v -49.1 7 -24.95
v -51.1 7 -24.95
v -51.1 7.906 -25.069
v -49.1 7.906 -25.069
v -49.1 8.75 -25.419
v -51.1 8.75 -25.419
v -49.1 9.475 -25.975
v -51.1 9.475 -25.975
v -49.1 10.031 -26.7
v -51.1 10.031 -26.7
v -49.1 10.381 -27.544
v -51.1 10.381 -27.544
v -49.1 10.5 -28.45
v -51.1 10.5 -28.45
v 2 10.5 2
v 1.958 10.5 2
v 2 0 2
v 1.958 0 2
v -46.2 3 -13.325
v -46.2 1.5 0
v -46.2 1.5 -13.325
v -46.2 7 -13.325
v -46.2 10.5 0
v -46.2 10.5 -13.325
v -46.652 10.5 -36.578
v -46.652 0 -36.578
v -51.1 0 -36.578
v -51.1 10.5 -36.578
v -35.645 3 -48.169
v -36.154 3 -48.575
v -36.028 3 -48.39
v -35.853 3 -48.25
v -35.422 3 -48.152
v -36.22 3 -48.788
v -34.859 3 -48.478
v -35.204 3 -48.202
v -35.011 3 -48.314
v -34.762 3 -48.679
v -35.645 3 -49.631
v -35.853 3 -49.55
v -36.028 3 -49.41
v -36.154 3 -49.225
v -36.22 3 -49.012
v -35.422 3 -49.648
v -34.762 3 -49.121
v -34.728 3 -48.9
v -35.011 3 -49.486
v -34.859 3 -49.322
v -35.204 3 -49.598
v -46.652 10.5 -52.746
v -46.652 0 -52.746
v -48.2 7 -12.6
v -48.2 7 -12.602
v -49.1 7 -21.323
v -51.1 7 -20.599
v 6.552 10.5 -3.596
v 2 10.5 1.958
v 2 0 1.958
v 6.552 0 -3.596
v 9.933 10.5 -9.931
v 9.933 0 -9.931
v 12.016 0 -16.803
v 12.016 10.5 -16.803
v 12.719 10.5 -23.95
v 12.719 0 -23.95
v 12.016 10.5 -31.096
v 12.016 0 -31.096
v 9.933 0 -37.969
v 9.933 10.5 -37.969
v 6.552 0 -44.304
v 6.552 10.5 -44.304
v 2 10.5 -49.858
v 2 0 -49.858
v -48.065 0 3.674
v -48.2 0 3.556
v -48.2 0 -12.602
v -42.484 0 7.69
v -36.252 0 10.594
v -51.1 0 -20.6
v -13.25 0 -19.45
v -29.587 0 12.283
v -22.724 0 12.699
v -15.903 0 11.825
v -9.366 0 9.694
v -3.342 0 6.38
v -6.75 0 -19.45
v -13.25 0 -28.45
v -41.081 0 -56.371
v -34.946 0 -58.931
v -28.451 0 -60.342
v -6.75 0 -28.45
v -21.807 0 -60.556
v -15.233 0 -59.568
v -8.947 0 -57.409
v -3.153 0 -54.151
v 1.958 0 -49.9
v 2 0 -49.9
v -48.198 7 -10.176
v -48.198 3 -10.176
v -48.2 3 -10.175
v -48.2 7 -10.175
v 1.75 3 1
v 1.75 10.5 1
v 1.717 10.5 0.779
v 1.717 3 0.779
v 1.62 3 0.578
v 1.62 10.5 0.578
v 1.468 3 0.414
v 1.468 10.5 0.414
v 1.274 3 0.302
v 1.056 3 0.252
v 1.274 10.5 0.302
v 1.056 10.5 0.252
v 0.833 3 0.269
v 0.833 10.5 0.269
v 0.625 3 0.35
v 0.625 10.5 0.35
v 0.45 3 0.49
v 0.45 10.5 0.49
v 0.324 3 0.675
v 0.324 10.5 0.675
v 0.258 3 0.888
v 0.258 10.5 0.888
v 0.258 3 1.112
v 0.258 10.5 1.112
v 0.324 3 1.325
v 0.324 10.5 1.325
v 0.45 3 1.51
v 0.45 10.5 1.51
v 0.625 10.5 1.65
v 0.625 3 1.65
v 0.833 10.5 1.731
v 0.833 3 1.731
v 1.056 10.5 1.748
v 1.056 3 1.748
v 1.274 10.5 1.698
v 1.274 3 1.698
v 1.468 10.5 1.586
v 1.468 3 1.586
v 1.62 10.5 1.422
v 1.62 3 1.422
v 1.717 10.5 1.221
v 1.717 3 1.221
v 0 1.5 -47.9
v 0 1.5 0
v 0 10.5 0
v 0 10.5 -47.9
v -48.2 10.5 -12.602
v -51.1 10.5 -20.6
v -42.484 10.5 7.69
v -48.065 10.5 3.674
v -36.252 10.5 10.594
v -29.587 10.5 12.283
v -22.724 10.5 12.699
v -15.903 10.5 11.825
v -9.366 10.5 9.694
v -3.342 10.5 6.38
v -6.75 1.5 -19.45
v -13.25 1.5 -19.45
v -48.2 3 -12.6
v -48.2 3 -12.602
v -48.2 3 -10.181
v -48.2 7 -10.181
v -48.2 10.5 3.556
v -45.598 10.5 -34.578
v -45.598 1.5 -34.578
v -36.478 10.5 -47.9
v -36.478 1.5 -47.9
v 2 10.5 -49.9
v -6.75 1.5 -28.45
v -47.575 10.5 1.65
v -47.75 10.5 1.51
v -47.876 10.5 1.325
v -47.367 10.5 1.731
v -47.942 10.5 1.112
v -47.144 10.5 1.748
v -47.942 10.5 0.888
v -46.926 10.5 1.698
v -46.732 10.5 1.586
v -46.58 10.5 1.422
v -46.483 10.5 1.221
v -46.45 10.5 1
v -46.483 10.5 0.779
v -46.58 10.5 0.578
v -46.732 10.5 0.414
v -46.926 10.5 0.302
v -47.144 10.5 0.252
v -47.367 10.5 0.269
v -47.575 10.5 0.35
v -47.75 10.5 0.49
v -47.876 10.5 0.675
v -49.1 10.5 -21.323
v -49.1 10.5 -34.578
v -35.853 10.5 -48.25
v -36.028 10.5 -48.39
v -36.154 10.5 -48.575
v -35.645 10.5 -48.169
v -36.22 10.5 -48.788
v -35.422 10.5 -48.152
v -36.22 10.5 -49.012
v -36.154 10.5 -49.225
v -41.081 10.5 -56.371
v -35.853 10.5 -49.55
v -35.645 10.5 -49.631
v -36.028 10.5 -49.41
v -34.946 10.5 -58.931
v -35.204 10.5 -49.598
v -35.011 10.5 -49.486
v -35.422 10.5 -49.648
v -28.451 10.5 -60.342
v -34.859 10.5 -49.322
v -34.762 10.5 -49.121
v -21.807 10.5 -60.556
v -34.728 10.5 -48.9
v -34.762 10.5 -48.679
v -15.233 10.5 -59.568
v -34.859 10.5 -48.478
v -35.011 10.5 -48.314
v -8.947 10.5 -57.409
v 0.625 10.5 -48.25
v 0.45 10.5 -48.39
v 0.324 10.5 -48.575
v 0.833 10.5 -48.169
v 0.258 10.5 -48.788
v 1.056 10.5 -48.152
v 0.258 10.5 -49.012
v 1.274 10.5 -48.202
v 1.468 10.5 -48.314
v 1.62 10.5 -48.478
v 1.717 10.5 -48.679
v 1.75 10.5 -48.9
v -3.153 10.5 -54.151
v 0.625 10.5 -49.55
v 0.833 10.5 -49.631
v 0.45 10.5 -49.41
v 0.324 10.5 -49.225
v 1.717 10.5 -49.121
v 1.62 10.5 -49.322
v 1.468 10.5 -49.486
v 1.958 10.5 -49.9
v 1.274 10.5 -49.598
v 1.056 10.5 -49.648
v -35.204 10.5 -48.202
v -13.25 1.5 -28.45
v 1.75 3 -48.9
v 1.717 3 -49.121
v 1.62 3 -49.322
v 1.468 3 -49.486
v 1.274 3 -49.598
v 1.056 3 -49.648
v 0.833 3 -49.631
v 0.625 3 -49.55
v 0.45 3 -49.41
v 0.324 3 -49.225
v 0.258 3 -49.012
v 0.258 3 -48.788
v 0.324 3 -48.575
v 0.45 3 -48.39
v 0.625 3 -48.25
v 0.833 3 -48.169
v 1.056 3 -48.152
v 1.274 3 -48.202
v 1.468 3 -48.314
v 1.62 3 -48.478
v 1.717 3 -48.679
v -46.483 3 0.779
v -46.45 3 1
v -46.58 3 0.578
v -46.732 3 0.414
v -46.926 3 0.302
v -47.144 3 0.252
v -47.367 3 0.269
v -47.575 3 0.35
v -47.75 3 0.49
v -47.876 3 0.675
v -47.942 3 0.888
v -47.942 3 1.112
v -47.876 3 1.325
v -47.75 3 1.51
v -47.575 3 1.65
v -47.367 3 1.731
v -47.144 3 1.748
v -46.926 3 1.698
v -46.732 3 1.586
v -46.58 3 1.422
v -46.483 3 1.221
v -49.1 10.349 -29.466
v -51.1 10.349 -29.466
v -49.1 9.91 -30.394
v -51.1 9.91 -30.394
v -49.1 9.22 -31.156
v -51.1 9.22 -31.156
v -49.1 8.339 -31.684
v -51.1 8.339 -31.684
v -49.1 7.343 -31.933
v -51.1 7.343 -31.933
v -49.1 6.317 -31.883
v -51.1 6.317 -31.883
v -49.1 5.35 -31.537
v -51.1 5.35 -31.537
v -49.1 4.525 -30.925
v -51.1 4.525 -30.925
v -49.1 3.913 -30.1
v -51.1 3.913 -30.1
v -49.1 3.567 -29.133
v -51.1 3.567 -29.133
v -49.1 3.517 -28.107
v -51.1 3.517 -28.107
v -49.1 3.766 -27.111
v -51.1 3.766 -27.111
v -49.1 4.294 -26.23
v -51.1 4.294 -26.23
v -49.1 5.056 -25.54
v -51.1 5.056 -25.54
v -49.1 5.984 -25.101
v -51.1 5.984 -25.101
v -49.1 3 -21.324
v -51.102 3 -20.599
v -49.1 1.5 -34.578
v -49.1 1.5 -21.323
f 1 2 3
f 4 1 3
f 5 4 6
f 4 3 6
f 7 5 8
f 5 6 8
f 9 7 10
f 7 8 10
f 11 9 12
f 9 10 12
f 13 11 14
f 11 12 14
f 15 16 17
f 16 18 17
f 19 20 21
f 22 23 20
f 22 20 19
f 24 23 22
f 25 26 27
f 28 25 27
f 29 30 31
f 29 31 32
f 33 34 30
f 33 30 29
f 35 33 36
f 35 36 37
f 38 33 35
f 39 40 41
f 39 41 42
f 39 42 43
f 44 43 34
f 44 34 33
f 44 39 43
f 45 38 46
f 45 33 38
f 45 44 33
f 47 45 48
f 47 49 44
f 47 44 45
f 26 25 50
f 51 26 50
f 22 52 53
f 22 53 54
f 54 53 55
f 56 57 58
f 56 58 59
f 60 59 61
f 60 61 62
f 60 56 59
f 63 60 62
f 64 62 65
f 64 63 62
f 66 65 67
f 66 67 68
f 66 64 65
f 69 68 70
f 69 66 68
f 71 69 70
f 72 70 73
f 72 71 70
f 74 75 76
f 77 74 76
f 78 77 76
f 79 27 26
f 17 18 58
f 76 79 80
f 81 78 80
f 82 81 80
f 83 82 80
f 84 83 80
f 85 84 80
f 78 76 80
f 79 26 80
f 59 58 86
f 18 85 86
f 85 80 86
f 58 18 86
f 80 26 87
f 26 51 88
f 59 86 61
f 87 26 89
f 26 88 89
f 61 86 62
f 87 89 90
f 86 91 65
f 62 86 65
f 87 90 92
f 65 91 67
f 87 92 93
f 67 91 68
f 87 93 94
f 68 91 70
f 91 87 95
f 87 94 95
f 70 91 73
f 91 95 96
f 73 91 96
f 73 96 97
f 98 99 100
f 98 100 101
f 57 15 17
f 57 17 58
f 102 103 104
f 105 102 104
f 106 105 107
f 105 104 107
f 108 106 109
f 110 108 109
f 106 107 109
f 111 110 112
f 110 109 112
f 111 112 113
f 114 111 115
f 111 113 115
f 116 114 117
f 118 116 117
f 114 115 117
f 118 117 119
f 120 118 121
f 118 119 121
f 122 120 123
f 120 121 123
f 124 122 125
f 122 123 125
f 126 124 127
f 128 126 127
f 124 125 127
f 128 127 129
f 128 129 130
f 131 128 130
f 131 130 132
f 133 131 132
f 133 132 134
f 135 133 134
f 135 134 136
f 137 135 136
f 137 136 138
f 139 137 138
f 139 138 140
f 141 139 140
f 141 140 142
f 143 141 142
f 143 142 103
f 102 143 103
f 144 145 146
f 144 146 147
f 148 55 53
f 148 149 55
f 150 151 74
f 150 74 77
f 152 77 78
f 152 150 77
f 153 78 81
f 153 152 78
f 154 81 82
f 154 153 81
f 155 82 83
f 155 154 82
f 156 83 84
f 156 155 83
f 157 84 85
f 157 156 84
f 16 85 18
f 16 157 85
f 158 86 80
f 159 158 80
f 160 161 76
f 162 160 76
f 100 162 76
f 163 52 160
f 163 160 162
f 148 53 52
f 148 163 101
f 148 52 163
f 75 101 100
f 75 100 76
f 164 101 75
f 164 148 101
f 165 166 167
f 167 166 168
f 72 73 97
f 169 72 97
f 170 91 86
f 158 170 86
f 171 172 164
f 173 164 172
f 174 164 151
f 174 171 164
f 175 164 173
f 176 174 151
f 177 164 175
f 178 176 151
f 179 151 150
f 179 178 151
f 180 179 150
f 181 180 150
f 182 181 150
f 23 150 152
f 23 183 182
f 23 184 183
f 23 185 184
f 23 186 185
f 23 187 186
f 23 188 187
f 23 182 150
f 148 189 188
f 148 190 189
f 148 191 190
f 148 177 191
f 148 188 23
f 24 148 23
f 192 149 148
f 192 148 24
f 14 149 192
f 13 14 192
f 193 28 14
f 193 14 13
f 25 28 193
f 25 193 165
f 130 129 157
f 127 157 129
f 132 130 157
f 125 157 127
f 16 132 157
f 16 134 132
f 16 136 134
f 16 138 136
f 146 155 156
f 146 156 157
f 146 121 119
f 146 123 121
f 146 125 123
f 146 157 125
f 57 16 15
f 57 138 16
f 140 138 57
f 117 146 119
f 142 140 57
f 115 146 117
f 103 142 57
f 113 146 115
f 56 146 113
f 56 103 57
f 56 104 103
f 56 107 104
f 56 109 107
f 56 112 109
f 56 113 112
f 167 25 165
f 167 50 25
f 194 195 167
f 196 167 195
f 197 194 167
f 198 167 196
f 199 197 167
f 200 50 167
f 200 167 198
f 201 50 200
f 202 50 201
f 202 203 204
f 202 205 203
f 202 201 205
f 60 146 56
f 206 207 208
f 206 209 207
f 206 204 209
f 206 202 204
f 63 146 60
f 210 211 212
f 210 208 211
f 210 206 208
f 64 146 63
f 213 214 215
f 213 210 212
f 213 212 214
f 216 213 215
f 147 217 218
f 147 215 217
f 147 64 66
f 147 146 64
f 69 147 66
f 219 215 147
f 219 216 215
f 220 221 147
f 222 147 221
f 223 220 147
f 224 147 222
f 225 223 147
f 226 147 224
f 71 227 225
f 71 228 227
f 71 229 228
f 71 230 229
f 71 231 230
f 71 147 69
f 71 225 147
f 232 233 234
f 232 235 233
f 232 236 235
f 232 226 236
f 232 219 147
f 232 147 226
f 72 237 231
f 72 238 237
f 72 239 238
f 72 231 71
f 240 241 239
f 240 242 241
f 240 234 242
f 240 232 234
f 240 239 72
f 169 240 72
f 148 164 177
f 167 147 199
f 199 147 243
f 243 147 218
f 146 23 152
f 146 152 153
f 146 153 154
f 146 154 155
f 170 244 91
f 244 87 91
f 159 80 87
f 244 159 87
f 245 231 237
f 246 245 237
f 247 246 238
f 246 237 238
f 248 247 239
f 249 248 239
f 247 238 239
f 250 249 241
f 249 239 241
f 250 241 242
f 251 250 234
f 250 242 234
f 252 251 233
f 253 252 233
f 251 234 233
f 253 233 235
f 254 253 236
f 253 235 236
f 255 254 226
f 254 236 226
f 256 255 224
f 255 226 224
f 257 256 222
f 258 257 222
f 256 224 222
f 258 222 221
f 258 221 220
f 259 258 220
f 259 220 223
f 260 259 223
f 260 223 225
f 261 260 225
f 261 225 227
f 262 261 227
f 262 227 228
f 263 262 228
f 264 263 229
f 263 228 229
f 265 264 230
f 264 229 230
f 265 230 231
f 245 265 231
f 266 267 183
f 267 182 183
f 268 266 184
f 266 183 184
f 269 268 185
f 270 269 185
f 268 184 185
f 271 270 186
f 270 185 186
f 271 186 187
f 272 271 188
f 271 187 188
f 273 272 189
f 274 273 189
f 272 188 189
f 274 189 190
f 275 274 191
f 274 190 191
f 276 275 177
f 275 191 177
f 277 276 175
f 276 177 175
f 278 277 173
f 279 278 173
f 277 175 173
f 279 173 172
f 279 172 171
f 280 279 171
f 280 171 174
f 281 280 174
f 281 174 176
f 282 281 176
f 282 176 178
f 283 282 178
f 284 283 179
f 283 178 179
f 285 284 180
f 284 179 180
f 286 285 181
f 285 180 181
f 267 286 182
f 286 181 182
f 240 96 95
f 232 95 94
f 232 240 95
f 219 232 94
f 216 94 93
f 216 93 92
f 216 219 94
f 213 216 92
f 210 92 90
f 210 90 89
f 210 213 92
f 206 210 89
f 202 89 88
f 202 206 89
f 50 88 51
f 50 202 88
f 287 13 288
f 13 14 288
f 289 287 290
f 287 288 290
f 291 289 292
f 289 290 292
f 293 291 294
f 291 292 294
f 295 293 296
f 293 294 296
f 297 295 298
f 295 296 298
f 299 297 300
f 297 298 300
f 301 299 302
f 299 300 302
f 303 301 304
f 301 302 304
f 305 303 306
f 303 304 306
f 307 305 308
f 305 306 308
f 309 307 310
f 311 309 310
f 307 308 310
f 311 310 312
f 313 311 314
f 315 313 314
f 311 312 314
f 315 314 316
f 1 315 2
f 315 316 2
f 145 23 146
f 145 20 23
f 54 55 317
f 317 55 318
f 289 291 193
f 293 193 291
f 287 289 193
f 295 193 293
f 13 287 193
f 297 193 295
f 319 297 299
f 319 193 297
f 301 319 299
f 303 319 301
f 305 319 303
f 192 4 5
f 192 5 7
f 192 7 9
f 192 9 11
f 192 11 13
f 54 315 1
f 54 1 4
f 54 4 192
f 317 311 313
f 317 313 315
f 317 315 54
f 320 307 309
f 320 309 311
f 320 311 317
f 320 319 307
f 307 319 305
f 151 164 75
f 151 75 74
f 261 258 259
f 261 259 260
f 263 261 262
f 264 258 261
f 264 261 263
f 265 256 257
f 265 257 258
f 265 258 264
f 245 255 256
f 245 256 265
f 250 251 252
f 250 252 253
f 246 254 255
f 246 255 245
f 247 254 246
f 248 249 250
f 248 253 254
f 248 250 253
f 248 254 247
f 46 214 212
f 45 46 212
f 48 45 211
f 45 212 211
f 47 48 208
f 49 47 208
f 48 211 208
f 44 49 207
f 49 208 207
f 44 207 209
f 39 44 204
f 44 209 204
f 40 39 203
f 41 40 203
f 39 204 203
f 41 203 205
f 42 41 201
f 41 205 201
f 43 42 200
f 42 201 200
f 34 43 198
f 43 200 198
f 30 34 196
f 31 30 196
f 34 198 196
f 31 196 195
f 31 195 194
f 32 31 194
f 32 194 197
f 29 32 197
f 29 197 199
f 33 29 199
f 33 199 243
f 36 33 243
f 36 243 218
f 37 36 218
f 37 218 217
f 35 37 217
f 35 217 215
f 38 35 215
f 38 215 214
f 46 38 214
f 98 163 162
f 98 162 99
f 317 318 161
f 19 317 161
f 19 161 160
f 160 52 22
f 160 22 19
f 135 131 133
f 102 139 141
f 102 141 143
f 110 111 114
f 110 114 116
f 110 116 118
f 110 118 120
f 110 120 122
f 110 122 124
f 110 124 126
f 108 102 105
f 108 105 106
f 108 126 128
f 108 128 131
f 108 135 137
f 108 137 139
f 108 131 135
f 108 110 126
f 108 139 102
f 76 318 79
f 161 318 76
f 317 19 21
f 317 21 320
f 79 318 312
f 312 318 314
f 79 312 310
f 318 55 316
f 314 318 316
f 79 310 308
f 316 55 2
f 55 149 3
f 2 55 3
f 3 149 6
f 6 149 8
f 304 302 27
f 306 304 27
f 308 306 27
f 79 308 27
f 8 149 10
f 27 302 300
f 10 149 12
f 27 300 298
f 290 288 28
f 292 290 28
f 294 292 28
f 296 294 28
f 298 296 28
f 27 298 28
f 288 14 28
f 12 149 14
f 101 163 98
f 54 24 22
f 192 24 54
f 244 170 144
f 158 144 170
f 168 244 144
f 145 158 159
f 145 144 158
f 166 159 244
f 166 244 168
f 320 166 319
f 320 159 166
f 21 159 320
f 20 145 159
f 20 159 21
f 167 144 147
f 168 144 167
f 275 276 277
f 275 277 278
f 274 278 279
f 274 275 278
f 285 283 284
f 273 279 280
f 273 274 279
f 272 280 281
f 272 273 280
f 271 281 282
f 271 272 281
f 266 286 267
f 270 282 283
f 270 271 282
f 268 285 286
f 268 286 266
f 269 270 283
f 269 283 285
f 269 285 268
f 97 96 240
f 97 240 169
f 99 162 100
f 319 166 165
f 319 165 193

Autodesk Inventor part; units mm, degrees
ref_plane "YZ Plane" through (0, 0, 0) normal (1, 0, 0) x (0, 1, 0)
ref_plane "XZ Plane" through (0, 0, 0) normal (0, 1, 0) x (-1, 0, 0)
ref_plane "XY Plane" through (0, 0, 0) normal (0, 0, 1) x (1, 0, 0)
sketch "Sketch1" plane through (0, 0, 0) normal (0, 1, 0) x (-1, 0, 0)
  line L0 (0, 0) -> (49.1, 0)
  line L1 (49.1, -47.9) -> (0, -47.9)
  line L2 (0, -47.9) -> (0, 0)
  line L3 (46.7, -10.9) -> (49.1, -18.9)
  line L4 (46.7, -10.9) -> (46.7, 0)
  line L5 (49.1, 0) -> (46.7, 0)
  line L6 (49.1, -18.9) -> (49.1, -47.9)
  dimension "d0" = 49.1
  dimension "d1" = 47.9
  dimension "d2" = 18.9
extrude "Extrusion1" add sketch "Sketch1" along normal blind 1.5
sketch "Sketch2" plane through (0, 1.5, 0) normal (0, 1, 0) x (1, 0, 0)
  line L0 (-49.1, 18.9) -> (-46.7, 10.9) projected
  line L1 (-46.2, 10.9) -> (-46.2, 0)
  line L2 (-46.2, 0) -> (-46.7, 0)
  line L3 (-46.7, 10.9) -> (-46.7, 0) projected
  line L4 (-46.7, 0) -> (-46.7, 10.9)
  line L5 (-49.1, 47.9) -> (-49.1, 18.9) projected
  line L6 (-46.7, 10.9) -> (-49.1, 18.9)
  line L7 (-49.1, 18.9) -> (-46.2, 10.9)
  point P0 (0, 0)
extrude "Extrusion2" cut sketch "Sketch2" against normal blind 10
sketch "Sketch3" plane through (0, 1.5, 0) normal (0, 1, 0) x (1, 0, 0)
  line L0 (-49.1, 47.9) -> (-49.1, 18.9) projected
  line L1 (-49.1, 34.5784) -> (-45.5979, 34.5784)
  line L2 (-45.5979, 34.5784) -> (-36.4784, 47.9)
  line L3 (0, 47.9) -> (-49.1, 47.9) projected
  line L4 (-49.1, 47.9) -> (-36.4784, 47.9)
  line L5 (-49.1, 47.9) -> (-49.1, 34.5784)
  point P0 (0, 0)
extrude "Extrusion3" cut sketch "Sketch3" against normal blind 10
sketch "Sketch4" plane through (0, 1.5, 0) normal (0, 1, 0) x (1, 0, 0)
  line L0 (-46.2, 10.9) -> (-49.1, 18.9) projected
  line L1 (-46.2, 0) -> (0, 0) projected
  line L2 (-46.2, -2) -> (0, -2)
  line L3 (0, -2) -> (2, -2)
  line L4 (2, -2) -> (2, 47.9)
  line L5 (0, 47.9) -> (-36.4784, 47.9) projected
  line L6 (2, 47.9) -> (2, 49.9)
  line L7 (2, 49.9) -> (-36.4784, 49.9)
  line L8 (-38.1287, 49.0298) -> (-37.533, 49.9)
  line L9 (-37.533, 49.9) -> (-36.4784, 49.9)
  line L10 (-45.5979, 34.5784) -> (-36.4784, 47.9) projected
  line L11 (-49.1, 36.5784) -> (-46.6525, 36.5784)
  line L12 (-46.6525, 36.5784) -> (-37.533, 49.9)
  line L13 (-46.2, -2) -> (-48.2, -2)
  line L14 (-48.2, -2) -> (-48.2, 10.9)
  line L15 (-51.1, 18.9) -> (-48.2, 10.9)
  line L16 (-49.1, 36.5784) -> (-51.1, 36.5784)
  line L17 (-51.1, 36.5784) -> (-51.1, 18.9)
  line L18 (0, 0) -> (0, 47.9) projected
  line L19 (0, 0) -> (0, 47.9)
  line L20 (0, 47.9) -> (-36.4784, 47.9)
  line L21 (-36.4784, 47.9) -> (-45.5979, 34.5784)
  line L22 (-45.5979, 34.5784) -> (-49.1, 34.5784) projected
  line L23 (-49.1, 34.5784) -> (-45.5979, 34.5784)
  line L24 (-49.1, 34.5784) -> (-49.1, 18.9) projected
  line L25 (-49.1, 34.5784) -> (-49.1, 18.9)
  line L26 (-49.1, 18.9) -> (-46.2, 10.9)
  line L27 (-46.2, 0) -> (-46.2, 10.9)
  line L28 (-46.2, 0) -> (0, 0)
  dimension "d16" = 2
  dimension "d17" = 2
  dimension "d18" = 2
  dimension "d23" = 2
extrude "Extrusion4" add sketch "Sketch4" along normal blind 9
sketch "Sketch5" plane through (0, 0, 0) normal (0, -1, 0) x (1, 0, 0)
  line L0 (-46.2, 0) -> (0, 0) projected
  line L1 (0, 0) -> (-46.2, 0)
  line L2 (-46.2, 0) -> (-46.2, -10.9) projected
  line L3 (-46.2, 0) -> (-46.2, -10.9)
  line L4 (-46.2, -10.9) -> (-49.1, -18.9) projected
  line L5 (-46.2, -10.9) -> (-49.1, -18.9)
  line L6 (-49.1, -18.9) -> (-49.1, -34.5784) projected
  line L7 (-49.1, -18.9) -> (-49.1, -34.5784)
  line L8 (-49.1, -34.5784) -> (-45.5979, -34.5784) projected
  line L9 (-49.1, -34.5784) -> (-45.5979, -34.5784)
  line L10 (-36.4784, -47.9) -> (-45.5979, -34.5784) projected
  line L11 (-45.5979, -34.5784) -> (-36.4784, -47.9)
  line L12 (-36.4784, -47.9) -> (0, -47.9) projected
  line L13 (-36.4784, -47.9) -> (0, -47.9)
  line L14 (0, -47.9) -> (0, 0)
  line L15 (-48.2, 2) -> (2, 2) projected
  line L16 (2, 2) -> (-48.2, 2)
  line L17 (-51.1, -18.9) -> (-48.2, -10.9) projected
  line L18 (-48.2, 2) -> (-48.2, -10.9)
  line L19 (-48.2, -10.9) -> (-51.1, -18.9)
  line L20 (-51.1, -18.9) -> (-51.1, -36.5784)
  line L21 (-46.6525, -36.5784) -> (-51.1, -36.5784) projected
  line L22 (-51.1, -36.5784) -> (-46.6525, -36.5784)
  line L23 (-37.533, -49.9) -> (-46.6525, -36.5784) projected
  line L24 (-46.6525, -36.5784) -> (-37.533, -49.9)
  line L25 (2, 2) -> (2, -49.9) projected
  line L26 (-37.533, -49.9) -> (2, -49.9)
  line L27 (2, -49.9) -> (2, 2)
extrude "Extrusion5" add sketch "Sketch5" against normal blind 1.5
sketch "Sketch6" plane through (0, 10.5, 0) normal (0, 1, 0) x (1, 0, 0)
  line L0 (-48.2, -2) -> (2, -2) projected
  circle A0 centre (1, -1) radius 0.75
  line L1 (-46.2, 0) -> (-46.2, 10.9) projected
  circle A1 centre (-47.2, -1) radius 0.75
  point P0 (0, 0)
  dimension "d35" = 1.5
sketch "Sketch7" plane through (0, 10.5, 0) normal (0, 1, 0) x (1, 0, 0)
  point P0 (0, 0)
extrude "Extrusion6" cut sketch "Sketch6" against normal blind 7.5
sketch "Sketch8" plane through (0, 10.5, 0) normal (0, 1, 0) x (1, 0, 0)
  line L0 (-45.5979, 34.5784) -> (-36.4784, 47.9) projected
  circle A0 centre (-35.4784, 48.9) radius 0.75
  circle A1 centre (1, 48.9) radius 0.75
  point P0 (0, 0)
  dimension "d40" = 1.5
  dimension "d43" = 1.5
extrude "Extrusion7" cut sketch "Sketch8" against normal blind 7.5
sketch "Sketch9" plane through (0, 0, 0) normal (0, -1, 0) x (1, 0, 0)
  line L0 (-48.2, 2) -> (2, 2) projected
  line L1 (2, 2) -> (2, -49.9) projected
  line L2 (-6.75, -23.95) -> (-6.75, -19.45)
  line L3 (-6.75, -19.45) -> (-13.25, -19.45)
  line L4 (-13.25, -19.45) -> (-13.25, -28.45)
  line L5 (-13.25, -28.45) -> (-6.75, -28.45)
  line L6 (-6.75, -28.45) -> (-6.75, -23.95)
  point P0 (0, 0)
  dimension "d51" = 6.5
  dimension "d52" = 9
extrude "Extrusion8" cut sketch "Sketch9" against normal blind 1.5
sketch "Sketch10" plane through (0, 10.5, 0) normal (0, 1, 0) x (1, 0, 0)
  line L0 (-49.1, 18.9) -> (-46.2, 10.9) projected
  line L1 (-48.2, -2) -> (-48.2, 10.9) projected
  line L2 (-48.2, 10.9) -> (-51.1, 18.9) projected
  line L3 (-48.2, 10.175) -> (-48.2, 10.9)
  line L4 (-51.1, 18.9) -> (-51.1, 36.5784) projected
  line L5 (-51.1, 18.175) -> (-51.1, 18.9)
  line L6 (-51.1, 18.175) -> (-48.2, 10.175)
  line L7 (-48.2, 10.9) -> (-51.1, 18.9)
  point P0 (0, 0)
extrude "Extrusion9" add sketch "Sketch10" against normal blind 10.5
sketch "Sketch11" plane through (-51.1, 0, -18.175) normal (-0.9401361, 0, 0.3407993) x (0.3407993, 0, 0.9401361)
  point P0 (34.5018, 0)
sketch "Sketch12" plane through (-51.1, 0, -18.175) normal (-0.9401361, 0, 0.3407993) x (0.3407993, 0, 0.9401361)
  line L0 (0, 10.5) -> (0, 0) projected
  line L1 (5.4546, 0) -> (3.2394, 0) projected
  line L2 (4.2545, 0) -> (7.2545, 0) construction
  line L3 (4.2545, 7) -> (0, 7)
  line L4 (0, 7) -> (0, 3)
  line L5 (0, 3) -> (8.5094, 3)
  line L6 (8.5094, 1.5) -> (8.5094, 10.5) projected
  line L7 (4.2545, 7) -> (8.5094, 7)
  line L8 (8.5094, 10.5) -> (8.5094, 0) projected
  line L9 (8.5094, 3) -> (8.5094, 7)
  line L10 (0, 10.5) -> (8.5094, 10.5) projected
  line L11 (0, 10.5) -> (0, 0) projected
  line L12 (8.5094, 0) -> (0, 0) projected
  line L13 (8.5094, 10.5) -> (8.5094, 0) projected
  point P0 (34.5018, 0)
  dimension "d58" = 4.2545
extrude "Extrusion10" cut sketch "Sketch12" along normal blind 5 contours L3 L7 L6 L5 L0
sketch "Sketch14" plane through (0, 10.5, 0) normal (0, 1, 0) x (1, 0, 0)
  point P0 (0, 0)
sketch "Sketch15" plane through (0, 10.5, 0) normal (0, 1, 0) x (1, 0, 0)
  line L0 (-46.2, 0) -> (-46.2, 10.9) projected
  line L1 (-46.2, 10.9) -> (-46.2, 11.9)
  line L2 (-46.2, 11.9) -> (-49.1, 19.8981)
  line L3 (-49.1, 34.5784) -> (-49.1, 18.9) projected
  line L4 (-46.2, 11.9) -> (-37.6924, 11.9) construction
  line L5 (-49.1, 19.8981) -> (-49.1, 18.9)
  line L6 (-49.1, 18.9) -> (-46.2, 10.9) projected
  line L7 (-49.1, 18.9) -> (-46.2, 10.9)
  point P0 (0, 0)
  dimension "d71" = 1
  dimension "d72" = 109.93
extrude "Extrusion12" add sketch "Sketch15" against normal blind 9
sketch "Sketch16" plane through (0, 10.5, 0) normal (0, 1, 0) x (1, 0, 0)
  line L0 (-51.1, 18.175) -> (-48.2, 10.175) projected
  line L1 (-51.1, 18.175) -> (-51.1, 19.175)
  line L2 (-51.1, 36.5784) -> (-51.1, 18.175) projected
  line L3 (-51.1, 19.175) -> (-48.2, 11.1769)
  line L4 (-51.1, 19.175) -> (-42.5924, 19.175) construction
  line L5 (-48.2, 11.1769) -> (-48.2, 10.175)
  line L6 (-48.2, 10.175) -> (-48.2, -2) projected
  line L7 (-51.1, 18.175) -> (-48.2, 10.175)
  point P0 (0, 0)
  dimension "d75" = 1
  dimension "d76" = 70.07
extrude "Extrusion13" cut sketch "Sketch16" against normal blind 10.5
sketch "Sketch17" plane through (-51.1, 0, -36.5784) normal (-1, 0, 0) x (0, 0, 1)
  line L0 (-13.3216, 0) -> (-13.3216, 10.5) projected
  line L1 (36.8284, 10.5) -> (36.8284, 3) projected
  line L2 (38.5784, 0) -> (38.5784, 10.5) projected
  line L3 (15.9784, 5.25) -> (15.9784, 10.5) construction
  line L4 (16.6804, 10.5) -> (2, 10.5) projected
  point P0 (36.5784, 0)
sketch "Sketch18" plane through (0, 10.5, 0) normal (0, 1, 0) x (1, 0, 0)
  line L0 (-51.1, 19.175) -> (-51.1, 36.5784) projected
  line L1 (-51.1, 19.175) -> (-51.1, 20.6)
  line L2 (-51.1, 20.6) -> (-48.2, 12.6019)
  line L3 (-51.1, 20.6) -> (-42.5924, 20.6) construction
  line L4 (-51.1, 19.175) -> (-48.2, 11.1769) projected
  line L5 (-48.2, 12.6019) -> (-48.2, 11.1769)
  line L6 (-51.1, 19.175) -> (-48.2, 11.1769)
  point P0 (0, 0)
  dimension "d82" = 1.425
  dimension "d83" = 70.07
extrude "Extrusion14" cut sketch "Sketch18" against normal blind 10.5
sketch "Sketch19" plane through (0, 10.5, 0) normal (0, 1, 0) x (1, 0, 0)
  line L0 (-46.2, 11.9) -> (-49.1, 19.8981) projected
  line L1 (-46.2, 11.9) -> (-46.2, 13.325)
  line L2 (-46.2, 13.325) -> (-49.1, 21.3231)
  line L3 (-49.1, 19.8981) -> (-49.1, 34.5784) projected
  line L4 (-49.1, 21.3231) -> (-49.1, 19.8981)
  line L5 (-49.1, 19.8981) -> (-46.2, 11.9)
  point P0 (0, 0)
  dimension "d86" = 1.425
  dimension "d87" = 160.07
extrude "Extrusion15" add sketch "Sketch19" against normal blind 9
sketch "Sketch20" plane through (-51.1, 0, -20.6) normal (-0.9401098, 0, 0.3408718) x (0.3408718, 0, 0.9401098)
  line L0 (0, 3) -> (8.5096, 3)
  line L1 (8.5096, 10.5) -> (8.5096, 1.5) projected
  line L2 (8.5096, 3) -> (8.5096, 7)
  line L3 (8.5096, 7) -> (0.002, 7)
  line L4 (0.002, 10.5) -> (0.002, 1.5) projected
  line L5 (0, 3) -> (0.002, 7)
  point P0 (36.7848, 0)
  point P1 (0, 0)
  point P2 (8.5096, 7)
  dimension "d90" = 3
  dimension "d91" = 4
extrude "Extrusion16" cut sketch "Sketch20" against normal blind 10
sketch "Sketch21" plane through (-51.1, 0, -36.5784) normal (-1, 0, 0) x (0, 0, 1)
  point P0 (36.5784, 0)
sketch "Sketch22" plane through (-51.1, 0, -36.5784) normal (-1, 0, 0) x (0, 0, 1)
  line L0 (15.9784, 0) -> (0, 0) projected
  line L1 (17.1284, 0) -> (8.1284, 0) projected
  circle A0 centre (8.1284, 7) radius 3.5
  point P0 (36.5784, 0)
  dimension "d98" = 7
extrude "Extrusion17" cut sketch "Sketch22" against normal blind 10
sketch "Sketch23" plane through (0, 10.5, 0) normal (0, 1, 0) x (1, 0, 0)
  line L0 (2, -2) -> (2, 49.9) projected
  line L1 (2, 23.95) -> (-23.95, 23.95)
  arc A0 (-48.065, -3.674) -> (-46.6525, 52.746) centre (-23.95, 23.95) ccw
  line L2 (2, -2) -> (-48.2, -2) projected
  line L3 (-48.2, -2) -> (-48.2, -3.5555)
  line L4 (-48.2, -3.5555) -> (-48.065, -3.674)
  line L5 (-46.6525, 36.5784) -> (-46.6525, 52.746)
  line L6 (-48.2, -2) -> (2, -2)
  line L7 (2, -2) -> (2, 49.9)
  line L8 (2, 49.9) -> (-37.533, 49.9)
  line L9 (-37.533, 49.9) -> (-46.6525, 36.5784)
  point P0 (0, 0)
  point P1 (1.9578, 49.9)
  point P2 (2, -1.9578)
  point P3 (2, 49.8578)
  point P4 (1.9578, -2)
  dimension "d114" = 25.95
  dimension "d115" = 36.669
extrude "Extrusion18" add sketch "Sketch23" against normal blind 10.5 contours A0 L4 L3 L2 | L8 L9 L5 A0 | L0 A0
properties part number "Case"
